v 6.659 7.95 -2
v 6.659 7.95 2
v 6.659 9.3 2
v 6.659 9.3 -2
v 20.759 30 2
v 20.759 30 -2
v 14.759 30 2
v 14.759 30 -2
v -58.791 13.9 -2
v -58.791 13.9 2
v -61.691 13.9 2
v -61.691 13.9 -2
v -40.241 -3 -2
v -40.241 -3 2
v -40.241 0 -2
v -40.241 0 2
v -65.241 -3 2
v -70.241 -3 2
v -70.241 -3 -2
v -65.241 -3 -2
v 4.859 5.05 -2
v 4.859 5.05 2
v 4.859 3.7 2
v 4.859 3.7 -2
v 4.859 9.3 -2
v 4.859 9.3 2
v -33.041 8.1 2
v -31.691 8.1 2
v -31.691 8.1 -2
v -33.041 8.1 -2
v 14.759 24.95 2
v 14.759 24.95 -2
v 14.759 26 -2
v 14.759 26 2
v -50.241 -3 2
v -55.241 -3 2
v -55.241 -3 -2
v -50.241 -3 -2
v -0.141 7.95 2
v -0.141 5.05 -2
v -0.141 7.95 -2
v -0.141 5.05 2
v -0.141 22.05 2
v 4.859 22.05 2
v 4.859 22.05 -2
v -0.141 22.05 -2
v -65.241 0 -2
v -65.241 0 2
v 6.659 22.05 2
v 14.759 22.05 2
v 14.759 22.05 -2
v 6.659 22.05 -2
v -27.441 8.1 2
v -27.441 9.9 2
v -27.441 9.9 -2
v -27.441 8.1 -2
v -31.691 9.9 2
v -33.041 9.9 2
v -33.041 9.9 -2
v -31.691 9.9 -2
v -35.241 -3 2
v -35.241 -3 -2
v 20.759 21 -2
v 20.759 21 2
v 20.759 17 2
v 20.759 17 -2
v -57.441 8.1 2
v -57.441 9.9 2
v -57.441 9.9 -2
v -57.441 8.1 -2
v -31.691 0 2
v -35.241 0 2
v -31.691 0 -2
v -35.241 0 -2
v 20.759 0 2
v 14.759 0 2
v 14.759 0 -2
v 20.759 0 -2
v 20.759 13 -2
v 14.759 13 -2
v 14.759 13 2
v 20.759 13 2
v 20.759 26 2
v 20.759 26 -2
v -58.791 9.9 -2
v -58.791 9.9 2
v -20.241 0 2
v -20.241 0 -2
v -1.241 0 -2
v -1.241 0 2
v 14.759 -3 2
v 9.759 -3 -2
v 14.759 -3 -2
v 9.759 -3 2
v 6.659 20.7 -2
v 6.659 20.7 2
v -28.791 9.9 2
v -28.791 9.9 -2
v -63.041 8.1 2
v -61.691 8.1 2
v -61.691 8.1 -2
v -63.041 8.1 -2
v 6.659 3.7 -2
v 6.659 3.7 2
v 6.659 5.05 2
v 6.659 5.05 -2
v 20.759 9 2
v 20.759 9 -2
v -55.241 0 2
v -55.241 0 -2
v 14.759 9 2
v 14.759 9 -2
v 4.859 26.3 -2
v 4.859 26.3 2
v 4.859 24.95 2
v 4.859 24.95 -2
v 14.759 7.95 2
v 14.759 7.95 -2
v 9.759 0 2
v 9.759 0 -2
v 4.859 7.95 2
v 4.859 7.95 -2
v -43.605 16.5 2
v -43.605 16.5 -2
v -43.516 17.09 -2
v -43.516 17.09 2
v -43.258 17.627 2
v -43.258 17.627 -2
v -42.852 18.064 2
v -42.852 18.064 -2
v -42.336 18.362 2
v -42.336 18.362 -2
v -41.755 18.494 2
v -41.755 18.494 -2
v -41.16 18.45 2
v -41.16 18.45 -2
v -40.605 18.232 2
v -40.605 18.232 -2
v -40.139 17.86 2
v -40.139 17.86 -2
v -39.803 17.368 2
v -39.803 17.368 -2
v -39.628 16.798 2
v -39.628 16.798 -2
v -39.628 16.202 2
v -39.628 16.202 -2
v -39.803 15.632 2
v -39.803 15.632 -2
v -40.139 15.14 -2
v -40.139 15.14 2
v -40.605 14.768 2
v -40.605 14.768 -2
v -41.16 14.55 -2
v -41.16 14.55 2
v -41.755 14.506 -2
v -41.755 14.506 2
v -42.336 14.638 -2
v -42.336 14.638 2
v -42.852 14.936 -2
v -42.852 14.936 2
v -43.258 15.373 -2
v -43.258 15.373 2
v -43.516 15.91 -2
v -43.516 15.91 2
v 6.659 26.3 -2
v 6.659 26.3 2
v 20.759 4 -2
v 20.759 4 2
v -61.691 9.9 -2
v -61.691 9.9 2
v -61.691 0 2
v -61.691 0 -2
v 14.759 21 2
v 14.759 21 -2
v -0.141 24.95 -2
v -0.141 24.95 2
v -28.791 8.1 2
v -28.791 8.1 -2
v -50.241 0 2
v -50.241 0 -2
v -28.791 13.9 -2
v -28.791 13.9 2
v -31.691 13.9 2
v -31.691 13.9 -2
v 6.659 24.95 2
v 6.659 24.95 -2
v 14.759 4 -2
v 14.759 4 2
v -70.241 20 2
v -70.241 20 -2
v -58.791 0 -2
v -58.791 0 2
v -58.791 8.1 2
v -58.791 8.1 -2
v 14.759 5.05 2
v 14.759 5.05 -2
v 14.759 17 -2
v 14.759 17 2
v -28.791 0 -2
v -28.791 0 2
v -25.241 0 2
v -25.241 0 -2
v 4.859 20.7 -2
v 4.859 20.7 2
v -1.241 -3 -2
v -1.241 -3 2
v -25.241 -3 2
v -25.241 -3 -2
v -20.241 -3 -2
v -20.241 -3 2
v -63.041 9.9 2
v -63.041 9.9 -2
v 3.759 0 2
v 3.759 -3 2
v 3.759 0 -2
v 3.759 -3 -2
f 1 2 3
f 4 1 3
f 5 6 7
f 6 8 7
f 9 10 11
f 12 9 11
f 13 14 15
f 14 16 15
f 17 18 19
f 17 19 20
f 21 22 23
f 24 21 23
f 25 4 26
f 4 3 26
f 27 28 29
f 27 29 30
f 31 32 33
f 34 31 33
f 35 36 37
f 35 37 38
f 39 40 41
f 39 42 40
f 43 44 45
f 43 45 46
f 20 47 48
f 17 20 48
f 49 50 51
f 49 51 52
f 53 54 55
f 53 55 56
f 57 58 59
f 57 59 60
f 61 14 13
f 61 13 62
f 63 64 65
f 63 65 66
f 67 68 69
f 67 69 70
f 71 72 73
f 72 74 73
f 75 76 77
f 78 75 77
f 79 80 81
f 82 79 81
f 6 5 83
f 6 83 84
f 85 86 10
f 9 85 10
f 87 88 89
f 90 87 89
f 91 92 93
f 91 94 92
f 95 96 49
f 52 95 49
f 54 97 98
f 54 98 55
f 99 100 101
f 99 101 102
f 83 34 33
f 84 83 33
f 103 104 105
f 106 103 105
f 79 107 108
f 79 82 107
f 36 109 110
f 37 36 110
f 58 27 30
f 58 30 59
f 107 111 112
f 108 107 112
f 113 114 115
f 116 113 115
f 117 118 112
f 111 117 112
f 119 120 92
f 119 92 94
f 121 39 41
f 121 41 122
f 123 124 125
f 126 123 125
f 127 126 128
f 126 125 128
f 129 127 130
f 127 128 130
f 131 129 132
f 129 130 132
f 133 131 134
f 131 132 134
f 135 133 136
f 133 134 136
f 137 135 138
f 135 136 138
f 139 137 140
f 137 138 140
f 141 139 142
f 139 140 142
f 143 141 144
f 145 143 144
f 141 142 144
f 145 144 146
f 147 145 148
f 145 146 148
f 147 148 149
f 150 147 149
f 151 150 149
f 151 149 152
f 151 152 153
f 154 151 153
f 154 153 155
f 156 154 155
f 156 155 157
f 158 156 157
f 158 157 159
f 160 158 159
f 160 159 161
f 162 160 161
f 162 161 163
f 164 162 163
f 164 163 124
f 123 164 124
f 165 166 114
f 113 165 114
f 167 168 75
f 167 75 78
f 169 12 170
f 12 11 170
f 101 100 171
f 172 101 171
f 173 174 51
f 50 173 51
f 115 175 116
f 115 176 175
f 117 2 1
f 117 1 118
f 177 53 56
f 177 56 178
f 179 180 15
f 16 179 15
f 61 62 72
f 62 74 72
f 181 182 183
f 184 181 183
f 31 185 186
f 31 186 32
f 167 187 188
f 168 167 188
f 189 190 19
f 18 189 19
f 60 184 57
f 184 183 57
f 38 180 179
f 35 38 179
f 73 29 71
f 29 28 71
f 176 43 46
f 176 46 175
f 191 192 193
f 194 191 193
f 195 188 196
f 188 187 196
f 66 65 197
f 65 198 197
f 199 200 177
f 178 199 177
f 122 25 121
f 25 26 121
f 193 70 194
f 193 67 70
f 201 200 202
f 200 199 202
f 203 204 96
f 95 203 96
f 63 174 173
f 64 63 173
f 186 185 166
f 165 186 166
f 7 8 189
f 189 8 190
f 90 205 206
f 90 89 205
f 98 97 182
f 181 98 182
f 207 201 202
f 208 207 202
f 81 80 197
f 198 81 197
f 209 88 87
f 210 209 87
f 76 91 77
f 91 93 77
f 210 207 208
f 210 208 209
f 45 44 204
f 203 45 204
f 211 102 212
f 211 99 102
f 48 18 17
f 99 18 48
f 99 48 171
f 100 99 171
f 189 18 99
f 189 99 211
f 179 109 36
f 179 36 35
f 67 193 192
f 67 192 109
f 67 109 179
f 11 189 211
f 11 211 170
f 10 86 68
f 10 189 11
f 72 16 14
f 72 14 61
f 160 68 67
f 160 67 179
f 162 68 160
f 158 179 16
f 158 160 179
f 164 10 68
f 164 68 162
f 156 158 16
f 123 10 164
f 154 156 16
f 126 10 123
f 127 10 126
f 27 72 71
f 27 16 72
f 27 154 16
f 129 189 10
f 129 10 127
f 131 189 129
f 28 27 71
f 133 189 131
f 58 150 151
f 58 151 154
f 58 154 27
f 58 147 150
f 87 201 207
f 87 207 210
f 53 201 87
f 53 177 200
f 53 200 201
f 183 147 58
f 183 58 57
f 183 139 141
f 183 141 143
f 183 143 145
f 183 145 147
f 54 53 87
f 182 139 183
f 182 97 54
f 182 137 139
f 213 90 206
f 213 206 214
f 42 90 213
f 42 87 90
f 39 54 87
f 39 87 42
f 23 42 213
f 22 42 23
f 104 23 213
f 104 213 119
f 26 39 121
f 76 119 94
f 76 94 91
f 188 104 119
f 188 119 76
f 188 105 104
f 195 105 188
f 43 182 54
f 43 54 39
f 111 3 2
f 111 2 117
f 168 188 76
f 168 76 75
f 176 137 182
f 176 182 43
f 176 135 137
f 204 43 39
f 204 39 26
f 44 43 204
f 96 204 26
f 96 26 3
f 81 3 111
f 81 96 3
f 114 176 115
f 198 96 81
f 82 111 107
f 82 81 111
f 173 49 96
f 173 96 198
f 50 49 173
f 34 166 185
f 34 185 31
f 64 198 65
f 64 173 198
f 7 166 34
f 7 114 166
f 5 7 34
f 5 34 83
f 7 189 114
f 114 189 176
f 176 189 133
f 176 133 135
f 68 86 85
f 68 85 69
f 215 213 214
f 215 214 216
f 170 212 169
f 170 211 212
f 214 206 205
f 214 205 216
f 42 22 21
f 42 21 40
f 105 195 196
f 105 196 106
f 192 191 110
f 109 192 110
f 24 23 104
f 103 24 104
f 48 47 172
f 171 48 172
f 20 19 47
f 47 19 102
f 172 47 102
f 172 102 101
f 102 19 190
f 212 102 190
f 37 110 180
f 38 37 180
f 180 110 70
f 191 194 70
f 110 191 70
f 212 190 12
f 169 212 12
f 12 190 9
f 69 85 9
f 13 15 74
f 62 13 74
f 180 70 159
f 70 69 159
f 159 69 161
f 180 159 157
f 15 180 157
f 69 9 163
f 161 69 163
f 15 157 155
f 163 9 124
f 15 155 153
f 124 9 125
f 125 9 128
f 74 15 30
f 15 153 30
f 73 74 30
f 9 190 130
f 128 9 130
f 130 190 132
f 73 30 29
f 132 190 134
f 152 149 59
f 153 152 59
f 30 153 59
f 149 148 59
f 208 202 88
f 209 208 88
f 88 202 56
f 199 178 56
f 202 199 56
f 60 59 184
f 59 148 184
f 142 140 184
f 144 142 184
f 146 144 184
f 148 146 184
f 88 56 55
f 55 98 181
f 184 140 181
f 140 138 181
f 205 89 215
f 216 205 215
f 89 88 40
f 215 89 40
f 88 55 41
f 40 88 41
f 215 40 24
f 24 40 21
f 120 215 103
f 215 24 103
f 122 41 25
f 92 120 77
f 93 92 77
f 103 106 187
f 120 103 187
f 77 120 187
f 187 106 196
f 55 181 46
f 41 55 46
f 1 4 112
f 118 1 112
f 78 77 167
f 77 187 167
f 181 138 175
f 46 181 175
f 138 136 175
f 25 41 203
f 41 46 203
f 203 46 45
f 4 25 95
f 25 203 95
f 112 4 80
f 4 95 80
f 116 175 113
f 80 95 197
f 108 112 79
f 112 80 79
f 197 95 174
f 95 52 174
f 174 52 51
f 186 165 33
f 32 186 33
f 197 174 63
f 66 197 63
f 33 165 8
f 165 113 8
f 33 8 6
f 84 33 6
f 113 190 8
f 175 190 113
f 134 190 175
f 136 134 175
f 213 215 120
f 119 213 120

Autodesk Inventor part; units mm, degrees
sketch "Эскиз1" plane through (0, 0, 0) normal (0, 0, 1) x (1, 0, 0)
  line L0 (-70.2411, 0) -> (14.7589, 0)
  line L1 (14.7589, 0) -> (14.7589, 30)
  line L2 (14.7589, 30) -> (-70.2411, 20)
  line L3 (0, 36) -> (0, -6) construction
  line L4 (-70.2411, 20) -> (-70.2411, 0)
  point P0 (0, 0)
  dimension "d0" = 30
  dimension "d1" = 85
  dimension "d46" = 14.7589
  dimension "d47" = 20
extrude "Выдавливание1" add sketch "Эскиз1" along normal mid plane 4
sketch "Эскиз2" plane through (-70.2411, 0, 2) normal (0, -1, 0) x (1, 0, 0)
  line L0 (0, -4) -> (0, 0) projected
  line L1 (85, 0) -> (0, 0) projected
  line L2 (0, -4) -> (5, -4)
  line L3 (5, -4) -> (5, 0)
  line L4 (5, 0) -> (0, 0)
  line L5 (0, 0) -> (0, -4)
  line L6 (0, -4) -> (85, -4) projected
  line L7 (15, -4) -> (20, -4)
  line L8 (20, -4) -> (20, 0)
  line L9 (20, 0) -> (15, 0)
  line L10 (15, 0) -> (15, -4)
  line L11 (30, -4) -> (35, -4)
  line L12 (35, -4) -> (35, 0)
  line L13 (35, 0) -> (30, 0)
  line L14 (30, 0) -> (30, -4)
  line L15 (45, -4) -> (50, -4)
  line L16 (50, -4) -> (50, 0)
  line L17 (50, 0) -> (45, 0)
  line L18 (45, 0) -> (45, -4)
  line L19 (85, -4) -> (80, -4)
  line L20 (80, -4) -> (80, 0)
  line L21 (80, 0) -> (85, 0)
  line L22 (85, 0) -> (85, -4)
  line L23 (74, -4) -> (69, -4)
  line L24 (69, -4) -> (69, 0)
  line L25 (69, 0) -> (74, 0)
  line L26 (74, 0) -> (74, -4)
  point P0 (70.2411, -2)
  point P1 (15, 0)
  point P2 (45, 0)
  point P3 (74, 0)
  dimension "d4" = 5
  dimension "d5" = 5
  dimension "d6" = 10
  dimension "d9" = 30
  dimension "d14" = 5
  dimension "d15" = 5
  dimension "d16" = 6
extrude "Выдавливание2" add sketch "Эскиз2" along normal blind 3 contours L0 L1 L3 L2 | L10 L1 L8 L6 | L14 L1 L12 L6 | L18 L1 L16 L6 | L24 L1 L26 L6 | L20 L1 L22 L6
sketch "Эскиз3" plane through (14.7589, 30, 2) normal (1, 0, 0) x (0, 0, -1)
  line L0 (4, 0) -> (0, 0) projected
  line L1 (4, 0) -> (0, 0)
  line L2 (0, 0) -> (0, -4)
  line L3 (0, -4) -> (4, -4)
  line L4 (4, -4) -> (4, 0)
  line L5 (4, -9) -> (0, -9)
  line L6 (0, -9) -> (0, -13)
  line L7 (0, -13) -> (4, -13)
  line L8 (4, -13) -> (4, -9)
  line L9 (4, 0) -> (4, -33) projected
  line L10 (4, -10) -> (4, 0) projected
  line L11 (0, 0) -> (0, -33) projected
  line L12 (4, -17) -> (0, -17)
  line L13 (0, -17) -> (0, -21)
  line L14 (0, -21) -> (4, -21)
  line L15 (4, -21) -> (4, -17)
  line L16 (4, -26) -> (0, -26)
  line L17 (0, -26) -> (0, -30)
  line L18 (0, -30) -> (4, -30)
  line L19 (4, -30) -> (4, -26)
  point P0 (2, -30)
  point P1 (4, -30)
  point P2 (4, -16.5)
  point P3 (4, -30)
  point P4 (0, -26)
  point P5 (0, -17)
  dimension "d19" = 4
  dimension "d20" = 4
  dimension "d21" = 5
  dimension "d29" = 4
  dimension "d30" = 5
  dimension "d31" = 4
  dimension "d32" = 4
extrude "Выдавливание3" add sketch "Эскиз3" along normal blind 6 contours L4 L3 L2 L0 | L8 L7 L6 L5 | L12 L9 L14 L11 | L16 L9 L18 L11
sketch "Эскиз4" plane through (0, 0, 2) normal (0, 0, 1) x (1, 0, 0)
  line L0 (-0.1411, 5.05) -> (-0.1411, 7.95)
  line L1 (14.7589, 7.95) -> (14.7589, 5.05)
  line L2 (6.6589, 9.3) -> (4.8589, 9.3)
  line L3 (4.8589, 3.7) -> (6.6589, 3.7)
  line L4 (14.7589, 9) -> (14.7589, 4) projected
  line L5 (14.7589, 6.5) -> (-0.1411, 6.5) construction
  line L6 (-0.1411, 7.95) -> (4.8589, 7.95)
  line L7 (6.6589, 7.95) -> (14.7589, 7.95)
  line L8 (6.6589, 3.7) -> (6.6589, 5.05)
  line L9 (6.6589, 7.95) -> (6.6589, 9.3)
  line L10 (4.8589, 9.3) -> (4.8589, 7.95)
  line L11 (4.8589, 5.05) -> (4.8589, 3.7)
  line L12 (14.7589, 5.05) -> (6.6589, 5.05)
  line L13 (4.8589, 5.05) -> (-0.1411, 5.05)
  line L14 (-0.1411, 22.05) -> (-0.1411, 24.95)
  line L15 (14.7589, 24.95) -> (14.7589, 22.05)
  line L16 (6.6589, 26.3) -> (4.8589, 26.3)
  line L17 (4.8589, 20.7) -> (6.6589, 20.7)
  line L18 (14.7589, 23.5) -> (-0.1411, 23.5) construction
  line L19 (-0.1411, 24.95) -> (4.8589, 24.95)
  line L20 (6.6589, 24.95) -> (14.7589, 24.95)
  line L21 (6.6589, 20.7) -> (6.6589, 22.05)
  line L22 (6.6589, 24.95) -> (6.6589, 26.3)
  line L23 (4.8589, 26.3) -> (4.8589, 24.95)
  line L24 (4.8589, 22.05) -> (4.8589, 20.7)
  line L25 (14.7589, 22.05) -> (6.6589, 22.05)
  line L26 (4.8589, 22.05) -> (-0.1411, 22.05)
  line L27 (14.7589, 26) -> (14.7589, 21) projected
  point P0 (0, 0)
  dimension "d33" = 2.9
  dimension "d34" = 1.8
  dimension "d35" = 5.6
  dimension "d37" = 1.35
  dimension "d38" = 5
  dimension "d39" = 8.1
  dimension "d40" = 2.9
  dimension "d41" = 1.8
  dimension "d42" = 5.6
  dimension "d43" = 1.35
  dimension "d44" = 5
  dimension "d45" = 8.1
extrude "Выдавливание4" cut sketch "Эскиз4" against normal up to surface (4 mm away)
sketch "Эскиз5" plane through (0, 0, 2) normal (0, 0, 1) x (1, 0, 0)
  line L0 (-61.6911, 0) -> (-58.7911, 0)
  line L1 (-58.7911, 13.9) -> (-61.6911, 13.9)
  line L2 (-31.6911, 0) -> (-28.7911, 0)
  line L3 (-28.7911, 13.9) -> (-31.6911, 13.9)
  line L4 (-60.2411, 0) -> (-60.2411, 13.9) construction
  line L5 (-30.2411, 13.9) -> (-30.2411, 0) construction
  line L6 (-57.4411, 9.9) -> (-57.4411, 8.1)
  line L7 (-63.0411, 8.1) -> (-63.0411, 9.9)
  line L8 (-27.4411, 9.9) -> (-27.4411, 8.1)
  line L9 (-33.0411, 8.1) -> (-33.0411, 9.9)
  line L10 (-63.0411, 9.9) -> (-61.6911, 9.9)
  line L11 (-58.7911, 9.9) -> (-57.4411, 9.9)
  line L12 (-61.6911, 13.9) -> (-61.6911, 9.9)
  line L13 (-61.6911, 8.1) -> (-61.6911, 0)
  line L14 (-57.4411, 8.1) -> (-58.7911, 8.1)
  line L15 (-61.6911, 8.1) -> (-63.0411, 8.1)
  line L16 (-58.7911, 0) -> (-58.7911, 8.1)
  line L17 (-58.7911, 9.9) -> (-58.7911, 13.9)
  line L18 (-33.0411, 9.9) -> (-31.6911, 9.9)
  line L19 (-28.7911, 9.9) -> (-27.4411, 9.9)
  line L20 (-27.4411, 8.1) -> (-28.7911, 8.1)
  line L21 (-31.6911, 8.1) -> (-33.0411, 8.1)
  line L22 (-31.6911, 13.9) -> (-31.6911, 9.9)
  line L23 (-31.6911, 8.1) -> (-31.6911, 0)
  line L24 (-28.7911, 0) -> (-28.7911, 8.1)
  line L25 (-28.7911, 9.9) -> (-28.7911, 13.9)
  line L26 (-65.2411, 0) -> (-55.2411, 0) projected
  line L27 (-35.2411, 0) -> (-25.2411, 0) projected
  point P0 (0, 0)
  dimension "d50" = 1.8
  dimension "d51" = 5.6
  dimension "d52" = 2.9
  dimension "d54" = 1.35
  dimension "d55" = 8.1
  dimension "d56" = 4
extrude "Выдавливание5" cut sketch "Эскиз5" against normal up to surface (4 mm away)
sketch "Эскиз6" plane through (0, 0, -2) normal (0, 0, -1) x (-1, 0, 0)
  circle A0 centre (41.6053, 16.5) radius 2
  point P0 (0, 0)
  dimension "d61" = 4
extrude "Выдавливание6" cut sketch "Эскиз6" against normal up to surface (4 mm away)
properties part number "Ребро жётскости крыла"
